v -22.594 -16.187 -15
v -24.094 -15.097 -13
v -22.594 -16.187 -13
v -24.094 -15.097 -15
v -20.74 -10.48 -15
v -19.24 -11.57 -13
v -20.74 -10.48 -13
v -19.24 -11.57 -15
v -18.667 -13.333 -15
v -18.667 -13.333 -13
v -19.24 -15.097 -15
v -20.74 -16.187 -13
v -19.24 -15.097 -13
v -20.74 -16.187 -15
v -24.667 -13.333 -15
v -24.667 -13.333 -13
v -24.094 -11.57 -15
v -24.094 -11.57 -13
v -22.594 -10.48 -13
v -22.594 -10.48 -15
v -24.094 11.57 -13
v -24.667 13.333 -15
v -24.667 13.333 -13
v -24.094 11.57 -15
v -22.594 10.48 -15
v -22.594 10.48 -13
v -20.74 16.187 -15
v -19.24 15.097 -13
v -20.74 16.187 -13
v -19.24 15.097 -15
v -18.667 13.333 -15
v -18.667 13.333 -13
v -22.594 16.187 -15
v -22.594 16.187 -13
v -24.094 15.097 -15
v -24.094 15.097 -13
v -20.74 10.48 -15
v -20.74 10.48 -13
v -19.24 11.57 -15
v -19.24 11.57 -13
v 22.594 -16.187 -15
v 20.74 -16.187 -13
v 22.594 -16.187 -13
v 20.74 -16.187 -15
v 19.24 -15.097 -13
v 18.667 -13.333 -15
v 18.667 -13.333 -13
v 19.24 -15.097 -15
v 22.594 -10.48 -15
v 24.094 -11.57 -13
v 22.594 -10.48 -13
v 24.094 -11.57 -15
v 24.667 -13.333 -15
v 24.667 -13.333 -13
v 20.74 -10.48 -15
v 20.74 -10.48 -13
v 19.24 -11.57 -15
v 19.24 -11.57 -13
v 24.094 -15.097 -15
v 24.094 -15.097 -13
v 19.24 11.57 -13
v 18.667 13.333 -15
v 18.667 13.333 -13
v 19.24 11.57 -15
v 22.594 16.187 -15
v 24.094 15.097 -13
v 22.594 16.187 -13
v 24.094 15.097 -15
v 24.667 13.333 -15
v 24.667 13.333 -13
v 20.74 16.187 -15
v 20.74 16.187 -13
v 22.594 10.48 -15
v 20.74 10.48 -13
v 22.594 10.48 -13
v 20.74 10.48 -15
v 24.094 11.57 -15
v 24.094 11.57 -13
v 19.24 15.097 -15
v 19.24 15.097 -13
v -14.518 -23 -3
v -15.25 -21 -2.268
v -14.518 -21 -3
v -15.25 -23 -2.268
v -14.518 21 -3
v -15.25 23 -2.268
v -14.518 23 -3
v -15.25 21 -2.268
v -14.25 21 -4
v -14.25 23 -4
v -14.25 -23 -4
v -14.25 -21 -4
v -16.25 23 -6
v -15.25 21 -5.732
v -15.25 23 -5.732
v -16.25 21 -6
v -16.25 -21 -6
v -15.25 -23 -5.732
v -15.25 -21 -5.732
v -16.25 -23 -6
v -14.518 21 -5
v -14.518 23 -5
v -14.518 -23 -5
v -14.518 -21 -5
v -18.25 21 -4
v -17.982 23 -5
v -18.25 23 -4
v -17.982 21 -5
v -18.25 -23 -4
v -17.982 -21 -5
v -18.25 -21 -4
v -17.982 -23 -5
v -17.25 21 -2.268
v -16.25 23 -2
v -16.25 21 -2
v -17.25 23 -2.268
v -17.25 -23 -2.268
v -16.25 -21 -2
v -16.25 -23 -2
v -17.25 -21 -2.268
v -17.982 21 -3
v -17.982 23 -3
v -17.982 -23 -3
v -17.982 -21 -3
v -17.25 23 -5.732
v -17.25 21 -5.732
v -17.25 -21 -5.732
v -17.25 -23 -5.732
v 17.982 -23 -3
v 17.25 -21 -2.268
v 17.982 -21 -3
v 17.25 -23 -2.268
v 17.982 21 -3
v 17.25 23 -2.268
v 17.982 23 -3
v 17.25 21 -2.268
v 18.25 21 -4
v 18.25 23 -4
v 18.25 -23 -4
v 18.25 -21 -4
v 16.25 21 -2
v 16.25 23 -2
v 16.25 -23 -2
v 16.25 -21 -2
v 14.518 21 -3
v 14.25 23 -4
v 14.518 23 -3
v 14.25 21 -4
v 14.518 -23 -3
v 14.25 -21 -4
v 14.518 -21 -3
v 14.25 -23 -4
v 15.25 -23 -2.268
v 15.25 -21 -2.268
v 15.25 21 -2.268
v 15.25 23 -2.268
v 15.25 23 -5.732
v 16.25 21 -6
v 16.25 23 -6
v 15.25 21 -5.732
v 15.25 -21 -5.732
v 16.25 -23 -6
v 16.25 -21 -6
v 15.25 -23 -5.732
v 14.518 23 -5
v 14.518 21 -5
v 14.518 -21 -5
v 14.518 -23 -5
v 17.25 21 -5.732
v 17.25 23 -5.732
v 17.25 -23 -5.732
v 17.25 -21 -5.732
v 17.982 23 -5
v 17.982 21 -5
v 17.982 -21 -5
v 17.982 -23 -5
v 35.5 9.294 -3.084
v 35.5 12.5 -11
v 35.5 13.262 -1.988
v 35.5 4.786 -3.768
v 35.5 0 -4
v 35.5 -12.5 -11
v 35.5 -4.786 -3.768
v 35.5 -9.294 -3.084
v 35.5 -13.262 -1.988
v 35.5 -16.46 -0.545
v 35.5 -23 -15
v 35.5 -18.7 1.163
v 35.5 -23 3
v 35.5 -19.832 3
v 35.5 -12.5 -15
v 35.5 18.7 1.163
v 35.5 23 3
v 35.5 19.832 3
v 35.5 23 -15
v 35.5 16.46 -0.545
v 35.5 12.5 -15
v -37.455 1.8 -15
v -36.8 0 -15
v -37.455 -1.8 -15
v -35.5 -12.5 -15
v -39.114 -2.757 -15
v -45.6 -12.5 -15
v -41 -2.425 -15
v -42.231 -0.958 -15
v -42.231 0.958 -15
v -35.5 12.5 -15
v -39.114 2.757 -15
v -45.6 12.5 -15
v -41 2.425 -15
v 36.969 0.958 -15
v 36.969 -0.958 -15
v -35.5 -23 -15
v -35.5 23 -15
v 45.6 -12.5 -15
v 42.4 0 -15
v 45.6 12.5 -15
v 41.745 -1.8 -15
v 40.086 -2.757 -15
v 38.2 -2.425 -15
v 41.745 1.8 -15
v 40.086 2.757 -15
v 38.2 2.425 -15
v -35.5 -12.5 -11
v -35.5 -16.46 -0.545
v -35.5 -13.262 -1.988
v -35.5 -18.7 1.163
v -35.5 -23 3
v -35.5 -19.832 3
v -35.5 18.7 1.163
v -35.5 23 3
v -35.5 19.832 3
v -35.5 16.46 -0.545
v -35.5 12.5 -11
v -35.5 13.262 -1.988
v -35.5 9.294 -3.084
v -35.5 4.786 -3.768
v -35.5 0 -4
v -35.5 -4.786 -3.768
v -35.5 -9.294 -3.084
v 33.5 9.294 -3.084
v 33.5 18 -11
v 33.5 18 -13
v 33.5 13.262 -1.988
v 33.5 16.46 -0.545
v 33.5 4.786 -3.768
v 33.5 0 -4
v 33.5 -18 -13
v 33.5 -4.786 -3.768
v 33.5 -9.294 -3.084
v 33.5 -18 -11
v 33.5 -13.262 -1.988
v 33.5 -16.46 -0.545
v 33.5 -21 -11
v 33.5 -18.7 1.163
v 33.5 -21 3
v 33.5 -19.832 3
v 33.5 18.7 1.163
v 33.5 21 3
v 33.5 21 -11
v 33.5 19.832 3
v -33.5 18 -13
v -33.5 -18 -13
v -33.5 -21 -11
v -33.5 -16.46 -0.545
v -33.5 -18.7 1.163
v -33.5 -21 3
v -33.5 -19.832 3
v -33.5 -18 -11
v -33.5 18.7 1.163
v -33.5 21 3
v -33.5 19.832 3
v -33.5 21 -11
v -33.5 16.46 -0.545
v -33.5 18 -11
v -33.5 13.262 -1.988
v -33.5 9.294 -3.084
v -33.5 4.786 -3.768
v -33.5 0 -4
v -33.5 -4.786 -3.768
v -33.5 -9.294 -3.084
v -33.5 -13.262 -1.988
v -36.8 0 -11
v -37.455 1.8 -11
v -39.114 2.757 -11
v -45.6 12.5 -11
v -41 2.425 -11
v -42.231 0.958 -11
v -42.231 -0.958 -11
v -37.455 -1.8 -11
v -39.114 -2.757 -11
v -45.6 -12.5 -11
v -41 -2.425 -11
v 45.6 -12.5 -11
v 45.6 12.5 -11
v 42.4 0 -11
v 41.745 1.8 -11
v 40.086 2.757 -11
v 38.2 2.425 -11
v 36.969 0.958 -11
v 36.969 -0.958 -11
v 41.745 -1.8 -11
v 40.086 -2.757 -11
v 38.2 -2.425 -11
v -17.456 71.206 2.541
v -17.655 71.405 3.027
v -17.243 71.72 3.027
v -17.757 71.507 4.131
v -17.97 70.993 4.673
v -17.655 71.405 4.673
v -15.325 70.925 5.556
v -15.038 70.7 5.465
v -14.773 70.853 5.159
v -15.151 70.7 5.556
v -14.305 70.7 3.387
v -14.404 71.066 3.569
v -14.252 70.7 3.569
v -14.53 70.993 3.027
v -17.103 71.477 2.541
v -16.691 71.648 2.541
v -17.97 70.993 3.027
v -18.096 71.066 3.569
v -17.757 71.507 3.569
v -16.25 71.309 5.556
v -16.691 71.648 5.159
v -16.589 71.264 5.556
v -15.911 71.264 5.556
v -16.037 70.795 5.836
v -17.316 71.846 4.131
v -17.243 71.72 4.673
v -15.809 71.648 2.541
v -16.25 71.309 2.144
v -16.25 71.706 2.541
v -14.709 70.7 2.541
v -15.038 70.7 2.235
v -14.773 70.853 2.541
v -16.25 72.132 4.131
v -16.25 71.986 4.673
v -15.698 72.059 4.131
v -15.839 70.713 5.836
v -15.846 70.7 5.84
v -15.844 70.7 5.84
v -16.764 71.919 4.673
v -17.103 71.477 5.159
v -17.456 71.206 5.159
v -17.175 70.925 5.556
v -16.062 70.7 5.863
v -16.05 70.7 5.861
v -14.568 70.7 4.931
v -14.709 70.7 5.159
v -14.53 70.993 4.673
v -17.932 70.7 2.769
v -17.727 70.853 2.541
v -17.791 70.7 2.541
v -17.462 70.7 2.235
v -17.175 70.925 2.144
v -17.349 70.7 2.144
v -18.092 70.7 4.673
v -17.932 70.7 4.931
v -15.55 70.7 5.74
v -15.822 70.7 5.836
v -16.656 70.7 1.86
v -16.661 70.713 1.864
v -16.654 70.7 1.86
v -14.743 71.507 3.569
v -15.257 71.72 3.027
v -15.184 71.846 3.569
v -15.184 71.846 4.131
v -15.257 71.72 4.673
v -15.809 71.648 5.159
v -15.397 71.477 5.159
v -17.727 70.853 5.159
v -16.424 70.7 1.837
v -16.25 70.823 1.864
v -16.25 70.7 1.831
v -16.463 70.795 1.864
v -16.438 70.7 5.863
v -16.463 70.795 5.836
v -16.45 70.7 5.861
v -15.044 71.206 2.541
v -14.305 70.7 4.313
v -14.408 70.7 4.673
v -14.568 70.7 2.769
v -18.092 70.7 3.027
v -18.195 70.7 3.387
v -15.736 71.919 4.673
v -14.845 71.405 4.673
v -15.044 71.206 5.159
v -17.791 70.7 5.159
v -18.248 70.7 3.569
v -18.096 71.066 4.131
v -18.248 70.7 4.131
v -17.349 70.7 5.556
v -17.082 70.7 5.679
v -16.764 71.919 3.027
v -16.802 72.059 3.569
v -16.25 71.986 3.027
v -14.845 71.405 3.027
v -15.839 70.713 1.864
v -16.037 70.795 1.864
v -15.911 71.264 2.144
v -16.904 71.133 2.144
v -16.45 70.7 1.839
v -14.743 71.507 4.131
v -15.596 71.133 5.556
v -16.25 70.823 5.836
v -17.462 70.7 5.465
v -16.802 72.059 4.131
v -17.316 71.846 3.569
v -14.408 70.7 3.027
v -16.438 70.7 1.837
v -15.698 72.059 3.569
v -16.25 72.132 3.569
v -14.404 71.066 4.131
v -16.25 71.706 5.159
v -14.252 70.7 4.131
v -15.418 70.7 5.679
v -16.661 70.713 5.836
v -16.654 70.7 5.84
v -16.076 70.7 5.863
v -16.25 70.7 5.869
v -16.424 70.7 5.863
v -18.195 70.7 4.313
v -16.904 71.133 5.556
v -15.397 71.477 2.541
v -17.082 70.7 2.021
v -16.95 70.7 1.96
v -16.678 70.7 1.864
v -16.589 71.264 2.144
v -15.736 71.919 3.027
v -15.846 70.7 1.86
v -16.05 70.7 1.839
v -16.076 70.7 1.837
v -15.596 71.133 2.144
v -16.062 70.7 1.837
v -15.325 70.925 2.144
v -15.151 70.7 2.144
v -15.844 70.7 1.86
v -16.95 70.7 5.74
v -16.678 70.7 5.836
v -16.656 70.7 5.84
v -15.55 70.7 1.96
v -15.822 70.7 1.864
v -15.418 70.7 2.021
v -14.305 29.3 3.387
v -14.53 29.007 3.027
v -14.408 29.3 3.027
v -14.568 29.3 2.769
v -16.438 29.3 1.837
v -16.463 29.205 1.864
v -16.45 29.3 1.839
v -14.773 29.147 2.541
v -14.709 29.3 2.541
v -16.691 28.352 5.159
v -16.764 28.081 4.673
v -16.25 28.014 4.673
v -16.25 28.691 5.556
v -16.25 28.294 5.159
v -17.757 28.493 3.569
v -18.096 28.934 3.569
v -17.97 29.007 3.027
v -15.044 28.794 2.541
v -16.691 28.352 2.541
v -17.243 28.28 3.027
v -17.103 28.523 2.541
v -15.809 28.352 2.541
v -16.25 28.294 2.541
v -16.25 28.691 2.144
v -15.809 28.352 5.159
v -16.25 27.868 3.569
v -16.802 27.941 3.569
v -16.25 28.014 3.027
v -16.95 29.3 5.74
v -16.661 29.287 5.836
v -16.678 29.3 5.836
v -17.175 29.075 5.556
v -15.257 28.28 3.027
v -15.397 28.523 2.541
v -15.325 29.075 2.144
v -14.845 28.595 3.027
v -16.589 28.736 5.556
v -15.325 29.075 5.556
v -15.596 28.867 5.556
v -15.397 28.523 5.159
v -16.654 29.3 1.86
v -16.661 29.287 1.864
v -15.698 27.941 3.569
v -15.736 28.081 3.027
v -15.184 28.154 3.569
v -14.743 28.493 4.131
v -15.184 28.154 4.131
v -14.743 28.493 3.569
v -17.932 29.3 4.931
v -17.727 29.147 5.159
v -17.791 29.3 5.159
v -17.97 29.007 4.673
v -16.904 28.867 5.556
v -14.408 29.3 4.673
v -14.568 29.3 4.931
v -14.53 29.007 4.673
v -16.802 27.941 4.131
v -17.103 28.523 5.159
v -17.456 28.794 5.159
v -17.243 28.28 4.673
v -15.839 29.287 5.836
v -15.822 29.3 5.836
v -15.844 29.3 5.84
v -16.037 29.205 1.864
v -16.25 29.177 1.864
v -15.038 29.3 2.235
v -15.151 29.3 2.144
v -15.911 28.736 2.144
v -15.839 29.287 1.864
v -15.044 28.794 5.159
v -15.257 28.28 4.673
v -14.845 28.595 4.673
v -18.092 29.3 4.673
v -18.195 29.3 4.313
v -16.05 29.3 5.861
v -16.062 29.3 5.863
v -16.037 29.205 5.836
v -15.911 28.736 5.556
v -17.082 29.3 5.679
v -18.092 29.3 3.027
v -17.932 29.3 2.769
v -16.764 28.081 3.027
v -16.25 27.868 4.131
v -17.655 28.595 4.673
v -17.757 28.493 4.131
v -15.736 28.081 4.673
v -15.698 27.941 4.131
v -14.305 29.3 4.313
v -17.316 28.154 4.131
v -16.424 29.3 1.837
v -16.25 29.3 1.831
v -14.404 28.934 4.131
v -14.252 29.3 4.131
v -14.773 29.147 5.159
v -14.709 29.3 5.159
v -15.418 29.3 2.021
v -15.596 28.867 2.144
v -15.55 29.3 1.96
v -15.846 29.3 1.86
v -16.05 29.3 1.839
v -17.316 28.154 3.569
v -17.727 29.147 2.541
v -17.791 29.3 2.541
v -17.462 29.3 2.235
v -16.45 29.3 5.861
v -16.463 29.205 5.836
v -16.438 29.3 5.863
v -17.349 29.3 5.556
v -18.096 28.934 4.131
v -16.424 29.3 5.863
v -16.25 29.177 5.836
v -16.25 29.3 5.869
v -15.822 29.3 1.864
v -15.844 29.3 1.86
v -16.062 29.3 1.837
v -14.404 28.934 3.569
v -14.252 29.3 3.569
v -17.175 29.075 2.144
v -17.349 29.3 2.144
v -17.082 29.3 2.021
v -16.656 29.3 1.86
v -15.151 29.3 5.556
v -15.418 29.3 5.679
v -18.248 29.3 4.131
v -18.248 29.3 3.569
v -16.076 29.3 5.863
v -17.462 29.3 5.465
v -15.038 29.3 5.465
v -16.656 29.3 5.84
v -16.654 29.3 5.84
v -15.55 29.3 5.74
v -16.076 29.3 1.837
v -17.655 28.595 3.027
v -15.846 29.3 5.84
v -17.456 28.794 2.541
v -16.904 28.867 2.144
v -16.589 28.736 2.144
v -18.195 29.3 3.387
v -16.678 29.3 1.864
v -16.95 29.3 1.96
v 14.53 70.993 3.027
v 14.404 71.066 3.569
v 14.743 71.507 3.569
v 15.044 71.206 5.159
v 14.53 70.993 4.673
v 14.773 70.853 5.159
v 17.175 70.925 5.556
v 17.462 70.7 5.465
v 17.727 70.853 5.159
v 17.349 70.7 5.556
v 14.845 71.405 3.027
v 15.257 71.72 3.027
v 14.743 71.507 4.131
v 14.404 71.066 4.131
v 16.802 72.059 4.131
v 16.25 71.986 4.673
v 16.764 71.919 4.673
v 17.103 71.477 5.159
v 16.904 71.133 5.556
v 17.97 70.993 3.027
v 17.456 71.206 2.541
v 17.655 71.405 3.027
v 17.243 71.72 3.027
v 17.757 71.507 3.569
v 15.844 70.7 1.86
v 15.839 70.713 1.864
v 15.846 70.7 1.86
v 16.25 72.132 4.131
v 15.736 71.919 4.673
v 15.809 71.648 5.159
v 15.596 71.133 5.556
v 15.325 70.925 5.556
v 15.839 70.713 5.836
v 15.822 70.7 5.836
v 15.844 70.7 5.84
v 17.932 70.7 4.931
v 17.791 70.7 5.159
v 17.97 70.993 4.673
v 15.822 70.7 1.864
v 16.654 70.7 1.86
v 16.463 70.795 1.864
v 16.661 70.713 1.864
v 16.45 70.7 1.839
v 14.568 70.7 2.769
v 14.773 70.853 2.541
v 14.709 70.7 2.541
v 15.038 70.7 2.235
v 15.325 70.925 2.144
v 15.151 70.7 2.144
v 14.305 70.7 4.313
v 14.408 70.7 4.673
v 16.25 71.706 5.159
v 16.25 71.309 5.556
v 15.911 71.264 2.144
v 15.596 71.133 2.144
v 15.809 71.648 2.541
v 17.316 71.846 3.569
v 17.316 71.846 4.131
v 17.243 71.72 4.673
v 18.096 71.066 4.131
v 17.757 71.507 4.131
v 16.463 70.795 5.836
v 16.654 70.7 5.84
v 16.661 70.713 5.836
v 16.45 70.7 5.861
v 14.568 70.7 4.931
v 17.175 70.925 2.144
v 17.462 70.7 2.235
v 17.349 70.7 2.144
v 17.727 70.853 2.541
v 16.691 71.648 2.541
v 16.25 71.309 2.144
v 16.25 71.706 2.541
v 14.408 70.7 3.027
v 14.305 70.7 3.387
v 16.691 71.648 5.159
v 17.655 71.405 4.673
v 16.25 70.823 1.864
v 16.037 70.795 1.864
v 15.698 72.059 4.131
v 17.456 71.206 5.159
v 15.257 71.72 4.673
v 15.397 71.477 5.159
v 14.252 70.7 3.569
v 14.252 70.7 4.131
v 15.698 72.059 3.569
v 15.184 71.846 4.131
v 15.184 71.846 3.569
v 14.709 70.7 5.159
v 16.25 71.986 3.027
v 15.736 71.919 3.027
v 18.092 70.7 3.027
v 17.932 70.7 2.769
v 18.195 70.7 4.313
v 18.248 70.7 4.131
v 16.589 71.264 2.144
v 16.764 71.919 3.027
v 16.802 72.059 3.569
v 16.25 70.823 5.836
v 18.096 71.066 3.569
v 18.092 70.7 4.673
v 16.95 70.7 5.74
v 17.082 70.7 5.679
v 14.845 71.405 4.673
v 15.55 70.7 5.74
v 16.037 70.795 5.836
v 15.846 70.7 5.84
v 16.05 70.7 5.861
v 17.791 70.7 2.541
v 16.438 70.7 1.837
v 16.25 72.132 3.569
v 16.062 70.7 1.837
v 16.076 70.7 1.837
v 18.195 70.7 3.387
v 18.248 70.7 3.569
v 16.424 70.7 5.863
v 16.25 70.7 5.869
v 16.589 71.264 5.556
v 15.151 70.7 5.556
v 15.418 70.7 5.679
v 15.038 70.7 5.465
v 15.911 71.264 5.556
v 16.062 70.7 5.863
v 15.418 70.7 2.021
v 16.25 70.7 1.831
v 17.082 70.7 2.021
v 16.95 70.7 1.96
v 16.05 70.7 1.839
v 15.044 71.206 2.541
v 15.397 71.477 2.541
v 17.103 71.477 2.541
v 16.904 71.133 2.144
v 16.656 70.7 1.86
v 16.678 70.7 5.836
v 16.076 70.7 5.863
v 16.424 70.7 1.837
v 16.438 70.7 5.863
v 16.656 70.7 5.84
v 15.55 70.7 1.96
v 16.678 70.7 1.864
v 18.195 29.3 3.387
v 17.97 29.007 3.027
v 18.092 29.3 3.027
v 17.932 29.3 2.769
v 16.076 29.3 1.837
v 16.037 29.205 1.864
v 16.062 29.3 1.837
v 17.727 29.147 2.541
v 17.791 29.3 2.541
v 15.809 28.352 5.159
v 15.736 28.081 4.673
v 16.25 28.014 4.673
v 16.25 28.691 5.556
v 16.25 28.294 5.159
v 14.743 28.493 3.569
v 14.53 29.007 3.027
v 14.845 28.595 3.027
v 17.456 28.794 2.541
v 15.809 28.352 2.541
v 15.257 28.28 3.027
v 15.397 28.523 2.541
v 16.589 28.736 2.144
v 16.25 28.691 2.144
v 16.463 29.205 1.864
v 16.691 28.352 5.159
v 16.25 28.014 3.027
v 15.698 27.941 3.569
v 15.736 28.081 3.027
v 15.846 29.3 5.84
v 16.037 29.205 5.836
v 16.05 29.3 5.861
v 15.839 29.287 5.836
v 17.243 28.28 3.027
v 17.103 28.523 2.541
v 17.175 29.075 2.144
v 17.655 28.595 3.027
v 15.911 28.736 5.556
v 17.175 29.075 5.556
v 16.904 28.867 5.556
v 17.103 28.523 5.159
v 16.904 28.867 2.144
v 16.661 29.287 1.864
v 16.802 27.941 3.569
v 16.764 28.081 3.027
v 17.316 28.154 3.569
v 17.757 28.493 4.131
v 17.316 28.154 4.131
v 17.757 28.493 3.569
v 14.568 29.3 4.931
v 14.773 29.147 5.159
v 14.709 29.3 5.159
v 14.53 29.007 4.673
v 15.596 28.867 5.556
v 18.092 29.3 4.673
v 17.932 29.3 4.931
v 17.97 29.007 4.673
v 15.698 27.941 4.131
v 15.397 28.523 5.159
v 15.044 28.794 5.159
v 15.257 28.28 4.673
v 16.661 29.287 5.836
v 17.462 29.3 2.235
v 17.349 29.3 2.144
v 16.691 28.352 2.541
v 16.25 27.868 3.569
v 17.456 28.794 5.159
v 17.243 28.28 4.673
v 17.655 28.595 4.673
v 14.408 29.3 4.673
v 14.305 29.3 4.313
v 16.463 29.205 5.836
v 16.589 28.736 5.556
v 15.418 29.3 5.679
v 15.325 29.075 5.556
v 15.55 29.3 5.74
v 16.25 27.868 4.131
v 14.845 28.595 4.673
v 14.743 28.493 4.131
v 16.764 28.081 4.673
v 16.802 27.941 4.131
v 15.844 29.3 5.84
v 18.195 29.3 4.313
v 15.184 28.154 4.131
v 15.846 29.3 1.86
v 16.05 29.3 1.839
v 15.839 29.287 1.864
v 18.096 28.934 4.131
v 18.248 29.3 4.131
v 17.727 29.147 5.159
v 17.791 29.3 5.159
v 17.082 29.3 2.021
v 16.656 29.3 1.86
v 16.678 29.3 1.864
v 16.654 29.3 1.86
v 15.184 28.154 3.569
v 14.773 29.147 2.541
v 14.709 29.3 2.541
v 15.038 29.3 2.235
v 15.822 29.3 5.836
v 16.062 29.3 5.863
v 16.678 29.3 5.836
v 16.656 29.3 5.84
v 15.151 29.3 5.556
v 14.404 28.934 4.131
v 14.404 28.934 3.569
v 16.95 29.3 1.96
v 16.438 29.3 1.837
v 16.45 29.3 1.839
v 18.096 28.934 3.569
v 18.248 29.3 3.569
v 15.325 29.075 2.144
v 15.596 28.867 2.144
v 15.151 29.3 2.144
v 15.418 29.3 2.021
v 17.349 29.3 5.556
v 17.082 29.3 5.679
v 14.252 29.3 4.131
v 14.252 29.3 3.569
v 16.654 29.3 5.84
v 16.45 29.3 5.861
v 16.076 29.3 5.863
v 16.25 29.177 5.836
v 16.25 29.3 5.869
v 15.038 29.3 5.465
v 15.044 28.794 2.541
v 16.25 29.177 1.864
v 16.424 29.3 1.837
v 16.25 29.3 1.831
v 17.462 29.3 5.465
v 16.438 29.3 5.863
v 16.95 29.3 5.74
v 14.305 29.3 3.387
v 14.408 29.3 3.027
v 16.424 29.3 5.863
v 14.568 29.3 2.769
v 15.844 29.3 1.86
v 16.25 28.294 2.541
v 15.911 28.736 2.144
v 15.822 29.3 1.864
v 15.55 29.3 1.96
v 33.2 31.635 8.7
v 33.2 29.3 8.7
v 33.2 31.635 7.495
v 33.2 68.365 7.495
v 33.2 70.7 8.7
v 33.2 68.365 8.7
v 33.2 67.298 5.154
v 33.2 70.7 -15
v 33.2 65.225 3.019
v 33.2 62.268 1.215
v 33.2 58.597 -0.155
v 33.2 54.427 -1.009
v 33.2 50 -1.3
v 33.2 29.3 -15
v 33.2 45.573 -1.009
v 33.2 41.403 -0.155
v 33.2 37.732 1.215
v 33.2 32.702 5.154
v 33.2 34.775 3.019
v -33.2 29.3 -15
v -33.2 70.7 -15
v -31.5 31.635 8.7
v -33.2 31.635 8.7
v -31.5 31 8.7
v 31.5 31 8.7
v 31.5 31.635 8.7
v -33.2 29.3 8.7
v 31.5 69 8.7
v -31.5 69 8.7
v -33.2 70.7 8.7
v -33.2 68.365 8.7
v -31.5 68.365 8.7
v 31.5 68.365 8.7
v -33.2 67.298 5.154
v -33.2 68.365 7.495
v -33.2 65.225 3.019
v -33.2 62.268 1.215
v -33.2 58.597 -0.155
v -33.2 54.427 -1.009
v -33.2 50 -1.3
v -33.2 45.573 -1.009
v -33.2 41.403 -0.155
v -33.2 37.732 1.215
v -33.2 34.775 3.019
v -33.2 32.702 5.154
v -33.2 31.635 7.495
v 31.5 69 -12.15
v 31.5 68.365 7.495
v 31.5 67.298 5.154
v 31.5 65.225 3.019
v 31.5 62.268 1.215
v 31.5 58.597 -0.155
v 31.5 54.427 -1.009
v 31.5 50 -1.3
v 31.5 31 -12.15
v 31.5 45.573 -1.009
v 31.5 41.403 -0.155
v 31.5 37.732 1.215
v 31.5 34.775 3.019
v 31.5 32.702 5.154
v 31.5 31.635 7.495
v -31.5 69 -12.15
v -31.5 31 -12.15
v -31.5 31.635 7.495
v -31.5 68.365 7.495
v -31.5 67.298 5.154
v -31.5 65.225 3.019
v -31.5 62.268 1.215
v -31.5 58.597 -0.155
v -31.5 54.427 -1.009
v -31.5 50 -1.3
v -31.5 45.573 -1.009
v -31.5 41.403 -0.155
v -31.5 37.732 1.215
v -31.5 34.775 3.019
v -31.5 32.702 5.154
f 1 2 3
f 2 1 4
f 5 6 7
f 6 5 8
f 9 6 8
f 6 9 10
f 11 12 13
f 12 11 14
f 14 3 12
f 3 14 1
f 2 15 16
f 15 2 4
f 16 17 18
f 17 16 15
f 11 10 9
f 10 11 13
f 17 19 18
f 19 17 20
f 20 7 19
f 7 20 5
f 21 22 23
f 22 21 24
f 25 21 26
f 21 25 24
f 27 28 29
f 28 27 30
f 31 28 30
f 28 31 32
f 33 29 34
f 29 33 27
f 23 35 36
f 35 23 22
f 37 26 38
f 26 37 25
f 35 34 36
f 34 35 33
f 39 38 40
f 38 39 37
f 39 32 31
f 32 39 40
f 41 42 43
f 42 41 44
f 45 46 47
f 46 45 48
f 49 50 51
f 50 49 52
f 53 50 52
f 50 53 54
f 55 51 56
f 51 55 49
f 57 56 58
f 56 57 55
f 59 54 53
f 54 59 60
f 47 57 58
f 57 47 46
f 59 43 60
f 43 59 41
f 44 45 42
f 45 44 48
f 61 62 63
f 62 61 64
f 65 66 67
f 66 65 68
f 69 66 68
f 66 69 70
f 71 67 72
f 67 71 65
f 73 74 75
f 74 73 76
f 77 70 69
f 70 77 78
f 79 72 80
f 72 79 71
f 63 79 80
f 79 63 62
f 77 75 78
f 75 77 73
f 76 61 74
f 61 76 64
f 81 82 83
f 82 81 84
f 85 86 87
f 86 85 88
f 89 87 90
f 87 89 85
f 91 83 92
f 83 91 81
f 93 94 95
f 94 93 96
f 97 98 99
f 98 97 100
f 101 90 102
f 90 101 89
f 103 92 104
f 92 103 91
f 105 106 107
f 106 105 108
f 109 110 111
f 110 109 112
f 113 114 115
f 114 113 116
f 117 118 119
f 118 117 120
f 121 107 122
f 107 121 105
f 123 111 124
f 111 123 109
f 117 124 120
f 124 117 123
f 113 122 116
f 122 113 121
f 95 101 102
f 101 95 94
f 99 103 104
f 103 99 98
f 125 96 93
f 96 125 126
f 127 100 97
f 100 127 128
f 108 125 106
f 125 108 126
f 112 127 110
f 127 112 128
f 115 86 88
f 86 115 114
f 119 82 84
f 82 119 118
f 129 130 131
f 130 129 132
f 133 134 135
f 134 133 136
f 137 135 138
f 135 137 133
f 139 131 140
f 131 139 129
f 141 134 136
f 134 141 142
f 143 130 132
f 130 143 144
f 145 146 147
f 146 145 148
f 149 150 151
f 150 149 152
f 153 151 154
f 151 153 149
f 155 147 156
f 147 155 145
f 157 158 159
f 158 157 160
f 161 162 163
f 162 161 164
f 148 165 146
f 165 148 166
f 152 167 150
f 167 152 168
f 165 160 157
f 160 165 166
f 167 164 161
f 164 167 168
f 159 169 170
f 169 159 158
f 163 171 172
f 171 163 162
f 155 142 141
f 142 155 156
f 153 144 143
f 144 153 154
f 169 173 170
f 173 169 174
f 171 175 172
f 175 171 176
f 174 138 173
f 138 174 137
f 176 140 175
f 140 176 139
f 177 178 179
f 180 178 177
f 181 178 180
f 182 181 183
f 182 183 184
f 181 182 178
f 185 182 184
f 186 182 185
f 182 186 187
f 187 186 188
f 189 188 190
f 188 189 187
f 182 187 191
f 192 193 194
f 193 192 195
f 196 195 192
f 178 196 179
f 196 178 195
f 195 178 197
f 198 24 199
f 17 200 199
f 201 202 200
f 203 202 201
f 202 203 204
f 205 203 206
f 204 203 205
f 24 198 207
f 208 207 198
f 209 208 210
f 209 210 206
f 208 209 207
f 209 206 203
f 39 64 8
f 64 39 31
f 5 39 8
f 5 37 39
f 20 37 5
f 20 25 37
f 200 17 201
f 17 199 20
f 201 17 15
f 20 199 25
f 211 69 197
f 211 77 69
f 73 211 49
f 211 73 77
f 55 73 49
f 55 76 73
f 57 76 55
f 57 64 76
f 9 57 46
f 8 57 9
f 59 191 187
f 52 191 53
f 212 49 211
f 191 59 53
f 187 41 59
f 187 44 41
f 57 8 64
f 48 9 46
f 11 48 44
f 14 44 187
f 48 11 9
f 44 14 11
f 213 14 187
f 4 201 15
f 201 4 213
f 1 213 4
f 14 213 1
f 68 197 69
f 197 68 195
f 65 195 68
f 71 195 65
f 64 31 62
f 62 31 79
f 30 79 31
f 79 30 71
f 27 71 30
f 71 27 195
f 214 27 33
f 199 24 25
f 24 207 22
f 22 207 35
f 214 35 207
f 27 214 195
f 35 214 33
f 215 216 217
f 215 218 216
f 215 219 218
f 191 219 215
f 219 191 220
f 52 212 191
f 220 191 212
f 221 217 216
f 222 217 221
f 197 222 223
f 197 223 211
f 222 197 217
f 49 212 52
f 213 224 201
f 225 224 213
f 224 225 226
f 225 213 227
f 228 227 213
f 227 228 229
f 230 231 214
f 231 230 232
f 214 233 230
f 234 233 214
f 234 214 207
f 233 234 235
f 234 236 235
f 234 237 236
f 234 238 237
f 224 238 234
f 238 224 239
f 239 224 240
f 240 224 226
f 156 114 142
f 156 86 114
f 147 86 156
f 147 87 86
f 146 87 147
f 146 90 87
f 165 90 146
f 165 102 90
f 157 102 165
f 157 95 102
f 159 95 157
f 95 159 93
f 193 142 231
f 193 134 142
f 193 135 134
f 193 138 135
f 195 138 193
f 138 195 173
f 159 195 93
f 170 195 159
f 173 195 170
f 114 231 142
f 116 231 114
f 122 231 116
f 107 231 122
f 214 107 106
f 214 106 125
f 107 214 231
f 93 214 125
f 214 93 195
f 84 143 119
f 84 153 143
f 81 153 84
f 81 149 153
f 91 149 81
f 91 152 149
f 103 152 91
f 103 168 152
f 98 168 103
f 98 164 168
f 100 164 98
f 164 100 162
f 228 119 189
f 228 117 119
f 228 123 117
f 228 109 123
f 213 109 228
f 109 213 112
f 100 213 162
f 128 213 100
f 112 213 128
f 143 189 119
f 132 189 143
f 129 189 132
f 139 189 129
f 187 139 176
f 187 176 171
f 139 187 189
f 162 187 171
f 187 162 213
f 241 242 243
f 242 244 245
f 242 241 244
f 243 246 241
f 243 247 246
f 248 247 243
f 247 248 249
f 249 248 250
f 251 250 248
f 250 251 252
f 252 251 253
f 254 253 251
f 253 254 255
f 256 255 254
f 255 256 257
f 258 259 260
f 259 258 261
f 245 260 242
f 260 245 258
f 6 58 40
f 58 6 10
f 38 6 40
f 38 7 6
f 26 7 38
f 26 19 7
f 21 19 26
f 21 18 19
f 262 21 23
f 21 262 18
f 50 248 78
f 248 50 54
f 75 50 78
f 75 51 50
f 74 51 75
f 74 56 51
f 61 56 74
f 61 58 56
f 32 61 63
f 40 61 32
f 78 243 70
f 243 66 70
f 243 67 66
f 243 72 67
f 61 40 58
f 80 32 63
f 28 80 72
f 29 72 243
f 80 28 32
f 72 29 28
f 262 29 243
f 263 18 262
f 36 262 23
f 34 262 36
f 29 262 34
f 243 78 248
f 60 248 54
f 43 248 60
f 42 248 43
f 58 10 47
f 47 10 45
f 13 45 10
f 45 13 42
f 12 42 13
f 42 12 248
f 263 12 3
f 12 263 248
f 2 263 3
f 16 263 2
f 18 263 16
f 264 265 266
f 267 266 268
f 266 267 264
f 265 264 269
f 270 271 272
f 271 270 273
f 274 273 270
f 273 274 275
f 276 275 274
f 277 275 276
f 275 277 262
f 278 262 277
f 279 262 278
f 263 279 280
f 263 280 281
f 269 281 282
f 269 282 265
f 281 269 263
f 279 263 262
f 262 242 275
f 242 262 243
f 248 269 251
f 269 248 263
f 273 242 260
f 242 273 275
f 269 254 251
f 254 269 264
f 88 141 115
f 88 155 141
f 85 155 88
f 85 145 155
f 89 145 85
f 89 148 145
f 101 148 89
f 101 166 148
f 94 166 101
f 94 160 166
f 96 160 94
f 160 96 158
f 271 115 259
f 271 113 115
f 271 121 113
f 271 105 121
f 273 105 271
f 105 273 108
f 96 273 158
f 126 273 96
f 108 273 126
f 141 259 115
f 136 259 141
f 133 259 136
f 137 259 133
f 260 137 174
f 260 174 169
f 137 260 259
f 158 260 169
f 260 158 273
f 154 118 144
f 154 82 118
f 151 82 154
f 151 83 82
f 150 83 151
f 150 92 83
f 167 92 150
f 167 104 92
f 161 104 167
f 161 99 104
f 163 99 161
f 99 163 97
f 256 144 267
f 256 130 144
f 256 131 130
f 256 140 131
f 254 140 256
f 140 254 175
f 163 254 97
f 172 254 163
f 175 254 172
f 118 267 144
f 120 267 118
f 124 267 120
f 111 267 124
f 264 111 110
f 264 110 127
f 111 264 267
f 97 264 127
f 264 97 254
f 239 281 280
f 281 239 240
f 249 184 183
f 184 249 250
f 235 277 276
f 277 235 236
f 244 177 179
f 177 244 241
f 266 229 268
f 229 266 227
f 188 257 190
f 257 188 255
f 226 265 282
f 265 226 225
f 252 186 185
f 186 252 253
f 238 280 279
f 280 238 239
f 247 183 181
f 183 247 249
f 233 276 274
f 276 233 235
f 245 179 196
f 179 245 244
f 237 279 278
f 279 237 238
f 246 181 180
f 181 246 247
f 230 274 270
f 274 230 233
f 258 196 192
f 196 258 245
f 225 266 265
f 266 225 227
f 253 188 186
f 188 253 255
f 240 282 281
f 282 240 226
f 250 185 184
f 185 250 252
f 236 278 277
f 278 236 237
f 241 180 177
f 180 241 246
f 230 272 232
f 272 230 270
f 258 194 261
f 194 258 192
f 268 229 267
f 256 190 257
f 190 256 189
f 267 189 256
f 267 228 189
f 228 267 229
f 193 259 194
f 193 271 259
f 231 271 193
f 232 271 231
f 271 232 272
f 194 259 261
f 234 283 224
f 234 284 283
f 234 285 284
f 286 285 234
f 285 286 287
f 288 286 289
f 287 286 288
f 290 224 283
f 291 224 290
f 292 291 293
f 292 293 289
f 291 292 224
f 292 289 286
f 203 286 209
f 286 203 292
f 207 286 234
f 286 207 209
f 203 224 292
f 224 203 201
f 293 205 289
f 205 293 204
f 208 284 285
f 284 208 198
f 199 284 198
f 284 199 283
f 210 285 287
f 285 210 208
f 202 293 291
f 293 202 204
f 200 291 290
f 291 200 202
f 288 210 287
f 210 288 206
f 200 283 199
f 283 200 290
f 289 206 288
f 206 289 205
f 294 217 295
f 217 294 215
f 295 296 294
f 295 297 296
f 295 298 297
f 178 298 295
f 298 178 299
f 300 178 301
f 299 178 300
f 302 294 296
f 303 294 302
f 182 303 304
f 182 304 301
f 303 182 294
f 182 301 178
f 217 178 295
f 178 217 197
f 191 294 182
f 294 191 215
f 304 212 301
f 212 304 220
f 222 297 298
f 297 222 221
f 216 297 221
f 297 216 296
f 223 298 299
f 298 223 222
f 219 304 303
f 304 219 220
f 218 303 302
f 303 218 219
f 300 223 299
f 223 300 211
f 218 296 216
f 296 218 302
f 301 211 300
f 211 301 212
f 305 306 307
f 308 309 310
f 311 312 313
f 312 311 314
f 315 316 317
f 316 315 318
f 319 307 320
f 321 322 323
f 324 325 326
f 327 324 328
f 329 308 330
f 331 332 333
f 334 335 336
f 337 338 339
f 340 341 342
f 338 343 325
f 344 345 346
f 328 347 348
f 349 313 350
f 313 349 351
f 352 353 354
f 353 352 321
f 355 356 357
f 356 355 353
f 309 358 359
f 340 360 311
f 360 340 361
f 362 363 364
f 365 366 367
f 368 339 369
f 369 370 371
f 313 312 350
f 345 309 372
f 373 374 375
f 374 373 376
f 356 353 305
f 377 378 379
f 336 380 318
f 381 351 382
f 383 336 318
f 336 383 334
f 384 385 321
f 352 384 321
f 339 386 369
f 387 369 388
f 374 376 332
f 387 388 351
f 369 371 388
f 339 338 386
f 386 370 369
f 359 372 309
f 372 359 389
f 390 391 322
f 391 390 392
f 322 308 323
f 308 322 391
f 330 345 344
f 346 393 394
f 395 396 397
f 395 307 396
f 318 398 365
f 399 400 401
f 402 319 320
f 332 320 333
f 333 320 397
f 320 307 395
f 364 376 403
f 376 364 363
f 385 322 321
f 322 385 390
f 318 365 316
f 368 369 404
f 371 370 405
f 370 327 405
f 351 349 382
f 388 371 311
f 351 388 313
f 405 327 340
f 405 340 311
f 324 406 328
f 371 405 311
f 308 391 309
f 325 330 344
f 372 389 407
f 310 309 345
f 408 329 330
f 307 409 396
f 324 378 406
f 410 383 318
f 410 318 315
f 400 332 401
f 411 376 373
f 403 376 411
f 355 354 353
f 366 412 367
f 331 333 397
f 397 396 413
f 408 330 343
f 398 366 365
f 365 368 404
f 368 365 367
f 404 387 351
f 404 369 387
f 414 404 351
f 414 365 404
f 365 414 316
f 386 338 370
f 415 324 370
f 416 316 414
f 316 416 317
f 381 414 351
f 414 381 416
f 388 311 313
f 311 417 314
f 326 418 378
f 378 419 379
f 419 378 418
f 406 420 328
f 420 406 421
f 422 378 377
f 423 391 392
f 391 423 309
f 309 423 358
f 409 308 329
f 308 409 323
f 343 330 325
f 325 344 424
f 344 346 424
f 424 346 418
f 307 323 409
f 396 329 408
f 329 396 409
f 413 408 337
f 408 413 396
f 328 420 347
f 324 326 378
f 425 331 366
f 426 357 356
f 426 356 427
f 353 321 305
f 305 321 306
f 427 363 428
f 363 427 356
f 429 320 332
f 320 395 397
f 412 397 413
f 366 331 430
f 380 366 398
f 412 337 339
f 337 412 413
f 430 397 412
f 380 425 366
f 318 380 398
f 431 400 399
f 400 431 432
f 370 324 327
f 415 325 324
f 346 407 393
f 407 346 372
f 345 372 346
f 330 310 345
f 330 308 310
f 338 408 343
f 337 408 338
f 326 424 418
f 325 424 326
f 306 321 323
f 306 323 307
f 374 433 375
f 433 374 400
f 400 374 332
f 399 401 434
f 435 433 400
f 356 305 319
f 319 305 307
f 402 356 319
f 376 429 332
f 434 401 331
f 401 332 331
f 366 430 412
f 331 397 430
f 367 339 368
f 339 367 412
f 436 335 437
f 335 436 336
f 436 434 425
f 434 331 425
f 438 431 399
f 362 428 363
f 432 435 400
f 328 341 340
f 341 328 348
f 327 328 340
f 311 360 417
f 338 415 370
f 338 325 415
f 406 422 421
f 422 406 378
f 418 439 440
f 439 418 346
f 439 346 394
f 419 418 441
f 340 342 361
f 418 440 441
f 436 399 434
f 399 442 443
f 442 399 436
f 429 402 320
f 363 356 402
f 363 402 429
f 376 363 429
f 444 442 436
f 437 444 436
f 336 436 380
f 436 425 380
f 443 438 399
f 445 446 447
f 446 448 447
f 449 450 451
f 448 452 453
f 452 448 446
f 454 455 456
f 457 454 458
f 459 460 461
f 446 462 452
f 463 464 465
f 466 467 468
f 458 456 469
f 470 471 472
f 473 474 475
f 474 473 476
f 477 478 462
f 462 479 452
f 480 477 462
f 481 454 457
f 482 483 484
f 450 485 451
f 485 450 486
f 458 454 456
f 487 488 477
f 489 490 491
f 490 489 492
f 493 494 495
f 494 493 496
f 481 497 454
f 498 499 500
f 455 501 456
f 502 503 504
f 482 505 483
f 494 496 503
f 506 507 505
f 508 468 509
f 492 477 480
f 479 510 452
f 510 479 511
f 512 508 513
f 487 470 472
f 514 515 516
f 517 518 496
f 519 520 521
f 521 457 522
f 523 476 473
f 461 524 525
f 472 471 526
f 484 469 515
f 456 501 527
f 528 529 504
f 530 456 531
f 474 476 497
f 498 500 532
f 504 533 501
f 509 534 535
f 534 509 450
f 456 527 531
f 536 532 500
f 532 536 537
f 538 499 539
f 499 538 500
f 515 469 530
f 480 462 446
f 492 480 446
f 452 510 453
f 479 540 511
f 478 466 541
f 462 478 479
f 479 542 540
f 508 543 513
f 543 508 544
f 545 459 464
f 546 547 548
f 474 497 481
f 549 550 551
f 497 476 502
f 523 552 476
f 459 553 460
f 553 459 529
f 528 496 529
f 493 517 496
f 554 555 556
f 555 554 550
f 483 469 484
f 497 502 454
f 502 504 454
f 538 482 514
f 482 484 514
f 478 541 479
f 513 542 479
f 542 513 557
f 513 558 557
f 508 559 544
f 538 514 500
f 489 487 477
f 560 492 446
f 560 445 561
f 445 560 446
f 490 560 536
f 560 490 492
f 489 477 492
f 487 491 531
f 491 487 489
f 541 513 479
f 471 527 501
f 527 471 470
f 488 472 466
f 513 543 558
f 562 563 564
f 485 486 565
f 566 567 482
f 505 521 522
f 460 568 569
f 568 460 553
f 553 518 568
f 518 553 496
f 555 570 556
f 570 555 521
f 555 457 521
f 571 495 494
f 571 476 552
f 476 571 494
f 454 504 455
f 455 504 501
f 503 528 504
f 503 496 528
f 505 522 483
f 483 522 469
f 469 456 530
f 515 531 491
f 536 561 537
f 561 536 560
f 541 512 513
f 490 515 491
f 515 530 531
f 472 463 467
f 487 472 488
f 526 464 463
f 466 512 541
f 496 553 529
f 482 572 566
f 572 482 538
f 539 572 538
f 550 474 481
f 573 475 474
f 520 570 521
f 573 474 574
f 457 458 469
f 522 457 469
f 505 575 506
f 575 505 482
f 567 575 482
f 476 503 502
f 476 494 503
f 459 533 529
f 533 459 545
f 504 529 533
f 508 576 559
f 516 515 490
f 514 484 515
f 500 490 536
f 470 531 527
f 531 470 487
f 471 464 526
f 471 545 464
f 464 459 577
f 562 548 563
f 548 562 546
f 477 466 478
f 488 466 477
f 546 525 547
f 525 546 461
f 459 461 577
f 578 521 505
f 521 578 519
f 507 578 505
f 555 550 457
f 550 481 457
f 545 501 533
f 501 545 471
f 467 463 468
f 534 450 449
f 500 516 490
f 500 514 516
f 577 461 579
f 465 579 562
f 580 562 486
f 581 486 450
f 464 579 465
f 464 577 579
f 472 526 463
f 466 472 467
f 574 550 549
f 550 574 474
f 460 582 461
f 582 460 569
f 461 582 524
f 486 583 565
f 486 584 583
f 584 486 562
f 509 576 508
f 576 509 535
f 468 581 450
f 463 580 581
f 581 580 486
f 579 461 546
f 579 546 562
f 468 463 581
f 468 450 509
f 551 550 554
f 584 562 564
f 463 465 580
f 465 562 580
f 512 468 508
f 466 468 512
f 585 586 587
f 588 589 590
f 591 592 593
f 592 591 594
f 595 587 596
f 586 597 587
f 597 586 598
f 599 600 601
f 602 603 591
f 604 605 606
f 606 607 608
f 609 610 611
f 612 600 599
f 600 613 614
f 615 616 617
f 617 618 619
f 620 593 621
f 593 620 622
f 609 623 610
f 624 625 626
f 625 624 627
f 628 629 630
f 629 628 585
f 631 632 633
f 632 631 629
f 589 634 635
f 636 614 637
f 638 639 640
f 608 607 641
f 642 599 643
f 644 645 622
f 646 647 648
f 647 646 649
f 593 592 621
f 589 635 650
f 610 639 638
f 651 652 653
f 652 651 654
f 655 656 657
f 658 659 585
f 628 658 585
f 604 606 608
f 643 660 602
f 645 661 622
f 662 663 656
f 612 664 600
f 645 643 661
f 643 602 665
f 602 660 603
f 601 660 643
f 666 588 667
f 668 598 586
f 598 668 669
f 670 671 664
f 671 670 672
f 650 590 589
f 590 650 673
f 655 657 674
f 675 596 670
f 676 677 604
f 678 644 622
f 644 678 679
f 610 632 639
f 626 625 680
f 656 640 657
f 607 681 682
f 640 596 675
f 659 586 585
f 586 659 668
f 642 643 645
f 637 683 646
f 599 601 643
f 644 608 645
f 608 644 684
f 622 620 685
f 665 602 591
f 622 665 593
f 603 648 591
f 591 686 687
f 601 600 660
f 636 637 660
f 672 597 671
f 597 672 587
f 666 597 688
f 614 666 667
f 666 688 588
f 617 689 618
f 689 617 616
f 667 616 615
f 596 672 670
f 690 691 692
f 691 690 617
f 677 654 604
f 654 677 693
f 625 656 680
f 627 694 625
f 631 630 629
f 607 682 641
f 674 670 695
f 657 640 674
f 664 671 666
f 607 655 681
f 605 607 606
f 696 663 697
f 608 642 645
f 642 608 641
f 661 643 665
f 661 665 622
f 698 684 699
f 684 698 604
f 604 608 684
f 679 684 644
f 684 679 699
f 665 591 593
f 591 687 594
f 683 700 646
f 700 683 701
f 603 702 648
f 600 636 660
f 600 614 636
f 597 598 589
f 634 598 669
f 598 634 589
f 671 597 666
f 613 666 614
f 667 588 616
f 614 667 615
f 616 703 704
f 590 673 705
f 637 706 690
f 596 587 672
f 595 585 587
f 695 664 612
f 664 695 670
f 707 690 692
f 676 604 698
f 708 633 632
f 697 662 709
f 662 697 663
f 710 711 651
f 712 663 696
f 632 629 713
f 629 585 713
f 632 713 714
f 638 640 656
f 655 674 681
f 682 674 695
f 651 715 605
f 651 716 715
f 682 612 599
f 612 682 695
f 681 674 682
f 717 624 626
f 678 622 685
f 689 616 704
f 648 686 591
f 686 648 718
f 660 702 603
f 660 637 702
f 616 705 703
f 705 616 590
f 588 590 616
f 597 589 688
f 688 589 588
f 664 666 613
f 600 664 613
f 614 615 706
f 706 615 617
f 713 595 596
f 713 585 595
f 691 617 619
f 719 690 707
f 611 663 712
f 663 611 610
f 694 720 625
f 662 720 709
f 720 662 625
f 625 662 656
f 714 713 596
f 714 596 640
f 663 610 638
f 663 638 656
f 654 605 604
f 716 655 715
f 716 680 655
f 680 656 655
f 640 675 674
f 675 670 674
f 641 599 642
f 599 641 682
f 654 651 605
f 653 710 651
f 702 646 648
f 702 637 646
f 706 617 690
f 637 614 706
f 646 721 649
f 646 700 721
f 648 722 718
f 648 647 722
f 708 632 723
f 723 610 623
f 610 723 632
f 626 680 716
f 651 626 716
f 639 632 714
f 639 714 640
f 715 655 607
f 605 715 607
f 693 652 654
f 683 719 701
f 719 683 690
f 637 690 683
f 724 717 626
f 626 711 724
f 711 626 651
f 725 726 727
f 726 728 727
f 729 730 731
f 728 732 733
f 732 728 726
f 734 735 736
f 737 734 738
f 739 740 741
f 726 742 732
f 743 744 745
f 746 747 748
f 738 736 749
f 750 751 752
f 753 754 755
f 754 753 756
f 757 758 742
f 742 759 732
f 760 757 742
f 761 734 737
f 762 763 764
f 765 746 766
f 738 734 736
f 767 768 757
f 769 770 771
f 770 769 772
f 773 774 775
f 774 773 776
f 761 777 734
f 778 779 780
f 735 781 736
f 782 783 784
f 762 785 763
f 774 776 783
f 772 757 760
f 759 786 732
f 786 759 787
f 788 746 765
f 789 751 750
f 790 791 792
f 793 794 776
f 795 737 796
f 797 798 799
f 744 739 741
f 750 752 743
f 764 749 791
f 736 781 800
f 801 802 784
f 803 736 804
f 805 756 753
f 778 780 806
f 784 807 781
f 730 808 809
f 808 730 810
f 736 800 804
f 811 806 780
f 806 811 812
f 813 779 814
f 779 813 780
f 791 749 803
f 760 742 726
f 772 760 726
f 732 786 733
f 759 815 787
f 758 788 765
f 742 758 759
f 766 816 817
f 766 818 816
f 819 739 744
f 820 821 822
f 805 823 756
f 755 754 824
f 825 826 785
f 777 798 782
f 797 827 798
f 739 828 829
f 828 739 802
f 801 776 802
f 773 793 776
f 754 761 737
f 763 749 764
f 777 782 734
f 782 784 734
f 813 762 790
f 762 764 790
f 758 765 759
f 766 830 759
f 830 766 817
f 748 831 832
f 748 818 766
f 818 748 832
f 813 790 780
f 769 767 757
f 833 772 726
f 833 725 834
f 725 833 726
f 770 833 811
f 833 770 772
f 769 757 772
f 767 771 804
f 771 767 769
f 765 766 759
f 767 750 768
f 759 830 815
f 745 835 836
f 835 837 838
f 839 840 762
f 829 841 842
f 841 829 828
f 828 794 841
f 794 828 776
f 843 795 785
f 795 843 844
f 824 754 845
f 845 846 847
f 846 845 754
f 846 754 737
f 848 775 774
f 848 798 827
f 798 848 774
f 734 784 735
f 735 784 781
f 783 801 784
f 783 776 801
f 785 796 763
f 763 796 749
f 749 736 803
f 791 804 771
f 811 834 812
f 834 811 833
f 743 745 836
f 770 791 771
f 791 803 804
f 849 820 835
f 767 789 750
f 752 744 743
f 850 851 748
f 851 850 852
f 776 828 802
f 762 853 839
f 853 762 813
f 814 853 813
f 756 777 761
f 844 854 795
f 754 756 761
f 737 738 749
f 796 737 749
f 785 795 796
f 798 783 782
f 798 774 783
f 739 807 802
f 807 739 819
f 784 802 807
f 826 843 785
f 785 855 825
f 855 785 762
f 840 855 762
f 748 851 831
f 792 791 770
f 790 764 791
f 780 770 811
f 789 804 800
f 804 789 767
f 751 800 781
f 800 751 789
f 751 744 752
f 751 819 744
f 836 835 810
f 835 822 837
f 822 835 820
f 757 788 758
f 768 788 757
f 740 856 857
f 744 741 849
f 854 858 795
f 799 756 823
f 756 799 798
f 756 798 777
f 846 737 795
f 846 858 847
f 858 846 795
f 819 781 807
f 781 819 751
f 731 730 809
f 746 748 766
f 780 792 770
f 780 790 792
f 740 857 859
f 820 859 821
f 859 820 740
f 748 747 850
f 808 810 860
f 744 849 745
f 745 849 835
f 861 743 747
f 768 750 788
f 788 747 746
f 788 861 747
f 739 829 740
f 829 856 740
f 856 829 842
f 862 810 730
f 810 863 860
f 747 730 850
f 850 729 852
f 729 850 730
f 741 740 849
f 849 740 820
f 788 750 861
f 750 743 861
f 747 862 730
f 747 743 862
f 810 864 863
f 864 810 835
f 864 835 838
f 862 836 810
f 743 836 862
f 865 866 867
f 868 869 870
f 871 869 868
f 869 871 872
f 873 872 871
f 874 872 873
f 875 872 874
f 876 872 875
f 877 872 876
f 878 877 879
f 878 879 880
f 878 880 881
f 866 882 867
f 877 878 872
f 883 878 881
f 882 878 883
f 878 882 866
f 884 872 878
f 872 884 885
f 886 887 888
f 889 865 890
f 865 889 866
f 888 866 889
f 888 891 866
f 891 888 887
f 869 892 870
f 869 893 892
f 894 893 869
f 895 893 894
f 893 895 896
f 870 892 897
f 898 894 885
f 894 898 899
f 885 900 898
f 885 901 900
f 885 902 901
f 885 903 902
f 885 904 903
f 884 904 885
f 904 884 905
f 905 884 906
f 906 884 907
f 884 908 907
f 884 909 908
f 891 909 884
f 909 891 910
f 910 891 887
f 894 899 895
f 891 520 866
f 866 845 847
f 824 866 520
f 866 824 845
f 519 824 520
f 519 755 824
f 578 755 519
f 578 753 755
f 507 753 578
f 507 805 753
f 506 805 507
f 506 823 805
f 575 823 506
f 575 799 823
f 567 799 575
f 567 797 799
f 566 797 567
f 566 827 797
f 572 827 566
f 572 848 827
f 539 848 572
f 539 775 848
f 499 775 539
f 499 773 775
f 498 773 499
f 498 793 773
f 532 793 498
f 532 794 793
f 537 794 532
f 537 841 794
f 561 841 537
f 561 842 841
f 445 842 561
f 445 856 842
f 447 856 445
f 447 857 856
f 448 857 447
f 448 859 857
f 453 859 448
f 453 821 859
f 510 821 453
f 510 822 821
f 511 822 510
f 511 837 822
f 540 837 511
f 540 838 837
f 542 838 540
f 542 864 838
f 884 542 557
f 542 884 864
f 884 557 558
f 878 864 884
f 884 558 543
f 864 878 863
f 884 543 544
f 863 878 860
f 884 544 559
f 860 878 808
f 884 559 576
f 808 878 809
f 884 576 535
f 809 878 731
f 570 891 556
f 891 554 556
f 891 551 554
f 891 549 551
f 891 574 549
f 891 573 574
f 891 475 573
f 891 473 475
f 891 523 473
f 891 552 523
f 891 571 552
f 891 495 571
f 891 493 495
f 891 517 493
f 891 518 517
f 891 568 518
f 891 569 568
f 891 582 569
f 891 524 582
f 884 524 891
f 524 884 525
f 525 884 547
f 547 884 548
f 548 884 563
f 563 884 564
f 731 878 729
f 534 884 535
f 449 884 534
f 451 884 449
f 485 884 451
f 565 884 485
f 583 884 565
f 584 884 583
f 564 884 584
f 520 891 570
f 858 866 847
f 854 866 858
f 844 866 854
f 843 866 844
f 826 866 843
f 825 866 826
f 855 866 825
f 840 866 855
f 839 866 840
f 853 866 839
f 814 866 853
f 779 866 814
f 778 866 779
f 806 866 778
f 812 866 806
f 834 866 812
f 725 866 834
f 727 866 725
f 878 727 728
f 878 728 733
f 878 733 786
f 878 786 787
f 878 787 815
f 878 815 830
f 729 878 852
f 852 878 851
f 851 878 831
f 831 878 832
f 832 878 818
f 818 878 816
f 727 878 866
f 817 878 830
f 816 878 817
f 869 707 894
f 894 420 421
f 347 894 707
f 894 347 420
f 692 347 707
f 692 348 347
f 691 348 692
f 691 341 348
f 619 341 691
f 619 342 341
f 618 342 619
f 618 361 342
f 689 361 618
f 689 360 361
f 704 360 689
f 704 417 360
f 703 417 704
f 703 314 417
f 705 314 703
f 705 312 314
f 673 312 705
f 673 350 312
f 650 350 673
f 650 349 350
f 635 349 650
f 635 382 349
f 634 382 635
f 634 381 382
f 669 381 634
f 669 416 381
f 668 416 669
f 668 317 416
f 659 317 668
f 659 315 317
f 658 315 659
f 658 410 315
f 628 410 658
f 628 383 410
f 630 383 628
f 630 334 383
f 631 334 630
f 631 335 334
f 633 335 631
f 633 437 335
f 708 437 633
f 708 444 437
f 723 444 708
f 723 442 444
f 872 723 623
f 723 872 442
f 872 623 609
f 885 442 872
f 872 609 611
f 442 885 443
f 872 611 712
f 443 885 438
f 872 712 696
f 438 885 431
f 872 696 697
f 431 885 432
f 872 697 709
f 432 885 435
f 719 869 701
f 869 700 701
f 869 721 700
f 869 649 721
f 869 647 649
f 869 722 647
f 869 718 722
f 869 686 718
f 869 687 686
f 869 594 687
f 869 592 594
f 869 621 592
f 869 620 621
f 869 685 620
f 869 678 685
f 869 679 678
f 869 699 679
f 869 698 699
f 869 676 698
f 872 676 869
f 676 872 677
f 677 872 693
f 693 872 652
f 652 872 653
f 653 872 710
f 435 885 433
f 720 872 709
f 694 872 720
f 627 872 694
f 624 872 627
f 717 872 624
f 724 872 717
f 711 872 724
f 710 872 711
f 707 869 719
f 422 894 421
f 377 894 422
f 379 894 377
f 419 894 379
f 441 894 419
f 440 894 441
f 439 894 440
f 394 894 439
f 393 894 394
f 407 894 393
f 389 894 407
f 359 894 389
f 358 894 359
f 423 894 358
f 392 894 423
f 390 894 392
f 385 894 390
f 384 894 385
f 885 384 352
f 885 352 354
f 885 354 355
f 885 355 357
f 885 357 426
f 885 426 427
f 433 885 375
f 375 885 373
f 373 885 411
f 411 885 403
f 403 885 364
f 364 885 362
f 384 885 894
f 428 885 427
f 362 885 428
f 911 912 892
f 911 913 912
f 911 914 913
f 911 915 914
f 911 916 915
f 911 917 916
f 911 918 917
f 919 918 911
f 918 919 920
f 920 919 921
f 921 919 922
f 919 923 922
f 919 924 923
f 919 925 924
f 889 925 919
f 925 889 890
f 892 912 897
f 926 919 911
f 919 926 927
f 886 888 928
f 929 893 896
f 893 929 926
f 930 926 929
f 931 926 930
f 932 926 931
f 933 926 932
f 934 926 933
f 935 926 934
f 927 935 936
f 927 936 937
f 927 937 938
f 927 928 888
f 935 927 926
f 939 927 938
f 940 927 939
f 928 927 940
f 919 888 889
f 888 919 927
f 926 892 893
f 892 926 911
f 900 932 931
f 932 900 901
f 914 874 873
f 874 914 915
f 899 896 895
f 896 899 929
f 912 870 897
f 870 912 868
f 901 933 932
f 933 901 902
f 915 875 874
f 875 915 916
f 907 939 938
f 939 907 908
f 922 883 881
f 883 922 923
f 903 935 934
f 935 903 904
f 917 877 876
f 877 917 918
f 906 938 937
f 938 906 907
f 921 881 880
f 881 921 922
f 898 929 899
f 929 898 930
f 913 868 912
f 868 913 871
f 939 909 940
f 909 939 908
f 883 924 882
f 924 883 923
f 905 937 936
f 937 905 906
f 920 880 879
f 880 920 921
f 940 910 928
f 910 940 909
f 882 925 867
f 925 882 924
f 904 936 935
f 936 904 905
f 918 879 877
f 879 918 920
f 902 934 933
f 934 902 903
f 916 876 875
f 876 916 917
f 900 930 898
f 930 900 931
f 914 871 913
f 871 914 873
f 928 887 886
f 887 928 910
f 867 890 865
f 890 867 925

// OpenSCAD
// [FL_INDEX: keywords="openscad, 3d_parametric, Customizable_PCB_Housing, csg_solid" | COT="Parametric OpenSCAD design from 3DCodeverse"]
// Title: Customizable PCB Housing


pcb = [ 65, 40, 22 ];
//pcb = [ 80, 44, 16 ];

c = 0.3;

difference()
{
translate( [ 0, 0, 0 ] )
 box( pcb[0]+6, pcb[1]+6, pcb[2]+8 );
translate( [ 0, 0, 1 ] )
 box( pcb[0]+2, pcb[1]-4, pcb[2]+6 );
translate( [ 0, 0, 2 ] )
 box( pcb[0]+2, pcb[1]+2, pcb[2]+4 );

for ( a = [ -1, +1 ], b = [ -1, +1 ] )
	translate( [ a*pcb[0]/3, b*pcb[1]/3, 0 ] )
		cylinder( r = 3, h = pcb[2]*2, center = true );

translate( [ 0, 0, -pcb[2]/2+12+3 ] ) rotate( [ 0, 90, 0 ] ) scale( [ 1, pcb[1]/16, 1 ] )
 cylinder( r = 8, h = pcb[0]*2, center = true );

for ( a = [ -1, +1 ] )
	translate( [ a*pcb[0]/4, 0, -pcb[2]/2+7 ] ) rotate( [ 90, 0, 0 ] )
		cylinder( r = 2, h = pcb[1]*2, center = true, $fn = 12 );

translate( [ 0, 0, 12 ] )
	box( pcb[0]+10, pcb[1]+10, pcb[2]-8/2 );
}

for ( a = [ -1, +1 ] )
translate( [ a*(pcb[0]/2+7.1), 0, - pcb[2]/2-2 ] )
	difference()
	{
		box( 12, 25, 4 );
		cylinder( r = 2.5+c, h = 10, center = true );
	}

translate( [ 0, pcb[1]+10, -c/2 ] )
rotate( [ 180, 0, 0 ] )
difference()
{
union()
{
	translate( [ 0, 0, 3 ] )
		box( pcb[0]+2-2*c, pcb[1]+2-2*c, pcb[2]+2-c );
	for ( a = [ -1, +1 ], b = [ -1, +1 ] )
		translate( [ a*pcb[0]/4, b*pcb[1]/2, -pcb[2]/2+7 ] )
			sphere( r = 2.15, center = true, $fn = 24 );
}
translate( [ 0, 0, 1 ] )
	box( pcb[0]-2, pcb[1]-2, pcb[2] );
translate( [ 0, 0, 3-(pcb[2]+2-c)/2 ] ) rotate( [ 0, 90, 0 ] ) scale( [ 1.25, (pcb[1]-3)/16, 1 ] )
	cylinder( r = 8, h = pcb[0]*2, center = true );
}


module box( x, y, z, w = 0 )
{
	difference()
	{
		cube( [ x - ( w < 0 ? w*2 : 0 ), y - ( w < 0 ? w*2 : 0 ), z - ( w < 0 ? w*2 : 0 ) ], center = true );

		if ( w != 0 )
			cube( [ x - ( w > 0 ? w*2 : 0 ), y - ( w > 0 ? w*2 : 0 ), z - ( w > 0 ? w*2 : 0 ) ], center = true );
	}
}
